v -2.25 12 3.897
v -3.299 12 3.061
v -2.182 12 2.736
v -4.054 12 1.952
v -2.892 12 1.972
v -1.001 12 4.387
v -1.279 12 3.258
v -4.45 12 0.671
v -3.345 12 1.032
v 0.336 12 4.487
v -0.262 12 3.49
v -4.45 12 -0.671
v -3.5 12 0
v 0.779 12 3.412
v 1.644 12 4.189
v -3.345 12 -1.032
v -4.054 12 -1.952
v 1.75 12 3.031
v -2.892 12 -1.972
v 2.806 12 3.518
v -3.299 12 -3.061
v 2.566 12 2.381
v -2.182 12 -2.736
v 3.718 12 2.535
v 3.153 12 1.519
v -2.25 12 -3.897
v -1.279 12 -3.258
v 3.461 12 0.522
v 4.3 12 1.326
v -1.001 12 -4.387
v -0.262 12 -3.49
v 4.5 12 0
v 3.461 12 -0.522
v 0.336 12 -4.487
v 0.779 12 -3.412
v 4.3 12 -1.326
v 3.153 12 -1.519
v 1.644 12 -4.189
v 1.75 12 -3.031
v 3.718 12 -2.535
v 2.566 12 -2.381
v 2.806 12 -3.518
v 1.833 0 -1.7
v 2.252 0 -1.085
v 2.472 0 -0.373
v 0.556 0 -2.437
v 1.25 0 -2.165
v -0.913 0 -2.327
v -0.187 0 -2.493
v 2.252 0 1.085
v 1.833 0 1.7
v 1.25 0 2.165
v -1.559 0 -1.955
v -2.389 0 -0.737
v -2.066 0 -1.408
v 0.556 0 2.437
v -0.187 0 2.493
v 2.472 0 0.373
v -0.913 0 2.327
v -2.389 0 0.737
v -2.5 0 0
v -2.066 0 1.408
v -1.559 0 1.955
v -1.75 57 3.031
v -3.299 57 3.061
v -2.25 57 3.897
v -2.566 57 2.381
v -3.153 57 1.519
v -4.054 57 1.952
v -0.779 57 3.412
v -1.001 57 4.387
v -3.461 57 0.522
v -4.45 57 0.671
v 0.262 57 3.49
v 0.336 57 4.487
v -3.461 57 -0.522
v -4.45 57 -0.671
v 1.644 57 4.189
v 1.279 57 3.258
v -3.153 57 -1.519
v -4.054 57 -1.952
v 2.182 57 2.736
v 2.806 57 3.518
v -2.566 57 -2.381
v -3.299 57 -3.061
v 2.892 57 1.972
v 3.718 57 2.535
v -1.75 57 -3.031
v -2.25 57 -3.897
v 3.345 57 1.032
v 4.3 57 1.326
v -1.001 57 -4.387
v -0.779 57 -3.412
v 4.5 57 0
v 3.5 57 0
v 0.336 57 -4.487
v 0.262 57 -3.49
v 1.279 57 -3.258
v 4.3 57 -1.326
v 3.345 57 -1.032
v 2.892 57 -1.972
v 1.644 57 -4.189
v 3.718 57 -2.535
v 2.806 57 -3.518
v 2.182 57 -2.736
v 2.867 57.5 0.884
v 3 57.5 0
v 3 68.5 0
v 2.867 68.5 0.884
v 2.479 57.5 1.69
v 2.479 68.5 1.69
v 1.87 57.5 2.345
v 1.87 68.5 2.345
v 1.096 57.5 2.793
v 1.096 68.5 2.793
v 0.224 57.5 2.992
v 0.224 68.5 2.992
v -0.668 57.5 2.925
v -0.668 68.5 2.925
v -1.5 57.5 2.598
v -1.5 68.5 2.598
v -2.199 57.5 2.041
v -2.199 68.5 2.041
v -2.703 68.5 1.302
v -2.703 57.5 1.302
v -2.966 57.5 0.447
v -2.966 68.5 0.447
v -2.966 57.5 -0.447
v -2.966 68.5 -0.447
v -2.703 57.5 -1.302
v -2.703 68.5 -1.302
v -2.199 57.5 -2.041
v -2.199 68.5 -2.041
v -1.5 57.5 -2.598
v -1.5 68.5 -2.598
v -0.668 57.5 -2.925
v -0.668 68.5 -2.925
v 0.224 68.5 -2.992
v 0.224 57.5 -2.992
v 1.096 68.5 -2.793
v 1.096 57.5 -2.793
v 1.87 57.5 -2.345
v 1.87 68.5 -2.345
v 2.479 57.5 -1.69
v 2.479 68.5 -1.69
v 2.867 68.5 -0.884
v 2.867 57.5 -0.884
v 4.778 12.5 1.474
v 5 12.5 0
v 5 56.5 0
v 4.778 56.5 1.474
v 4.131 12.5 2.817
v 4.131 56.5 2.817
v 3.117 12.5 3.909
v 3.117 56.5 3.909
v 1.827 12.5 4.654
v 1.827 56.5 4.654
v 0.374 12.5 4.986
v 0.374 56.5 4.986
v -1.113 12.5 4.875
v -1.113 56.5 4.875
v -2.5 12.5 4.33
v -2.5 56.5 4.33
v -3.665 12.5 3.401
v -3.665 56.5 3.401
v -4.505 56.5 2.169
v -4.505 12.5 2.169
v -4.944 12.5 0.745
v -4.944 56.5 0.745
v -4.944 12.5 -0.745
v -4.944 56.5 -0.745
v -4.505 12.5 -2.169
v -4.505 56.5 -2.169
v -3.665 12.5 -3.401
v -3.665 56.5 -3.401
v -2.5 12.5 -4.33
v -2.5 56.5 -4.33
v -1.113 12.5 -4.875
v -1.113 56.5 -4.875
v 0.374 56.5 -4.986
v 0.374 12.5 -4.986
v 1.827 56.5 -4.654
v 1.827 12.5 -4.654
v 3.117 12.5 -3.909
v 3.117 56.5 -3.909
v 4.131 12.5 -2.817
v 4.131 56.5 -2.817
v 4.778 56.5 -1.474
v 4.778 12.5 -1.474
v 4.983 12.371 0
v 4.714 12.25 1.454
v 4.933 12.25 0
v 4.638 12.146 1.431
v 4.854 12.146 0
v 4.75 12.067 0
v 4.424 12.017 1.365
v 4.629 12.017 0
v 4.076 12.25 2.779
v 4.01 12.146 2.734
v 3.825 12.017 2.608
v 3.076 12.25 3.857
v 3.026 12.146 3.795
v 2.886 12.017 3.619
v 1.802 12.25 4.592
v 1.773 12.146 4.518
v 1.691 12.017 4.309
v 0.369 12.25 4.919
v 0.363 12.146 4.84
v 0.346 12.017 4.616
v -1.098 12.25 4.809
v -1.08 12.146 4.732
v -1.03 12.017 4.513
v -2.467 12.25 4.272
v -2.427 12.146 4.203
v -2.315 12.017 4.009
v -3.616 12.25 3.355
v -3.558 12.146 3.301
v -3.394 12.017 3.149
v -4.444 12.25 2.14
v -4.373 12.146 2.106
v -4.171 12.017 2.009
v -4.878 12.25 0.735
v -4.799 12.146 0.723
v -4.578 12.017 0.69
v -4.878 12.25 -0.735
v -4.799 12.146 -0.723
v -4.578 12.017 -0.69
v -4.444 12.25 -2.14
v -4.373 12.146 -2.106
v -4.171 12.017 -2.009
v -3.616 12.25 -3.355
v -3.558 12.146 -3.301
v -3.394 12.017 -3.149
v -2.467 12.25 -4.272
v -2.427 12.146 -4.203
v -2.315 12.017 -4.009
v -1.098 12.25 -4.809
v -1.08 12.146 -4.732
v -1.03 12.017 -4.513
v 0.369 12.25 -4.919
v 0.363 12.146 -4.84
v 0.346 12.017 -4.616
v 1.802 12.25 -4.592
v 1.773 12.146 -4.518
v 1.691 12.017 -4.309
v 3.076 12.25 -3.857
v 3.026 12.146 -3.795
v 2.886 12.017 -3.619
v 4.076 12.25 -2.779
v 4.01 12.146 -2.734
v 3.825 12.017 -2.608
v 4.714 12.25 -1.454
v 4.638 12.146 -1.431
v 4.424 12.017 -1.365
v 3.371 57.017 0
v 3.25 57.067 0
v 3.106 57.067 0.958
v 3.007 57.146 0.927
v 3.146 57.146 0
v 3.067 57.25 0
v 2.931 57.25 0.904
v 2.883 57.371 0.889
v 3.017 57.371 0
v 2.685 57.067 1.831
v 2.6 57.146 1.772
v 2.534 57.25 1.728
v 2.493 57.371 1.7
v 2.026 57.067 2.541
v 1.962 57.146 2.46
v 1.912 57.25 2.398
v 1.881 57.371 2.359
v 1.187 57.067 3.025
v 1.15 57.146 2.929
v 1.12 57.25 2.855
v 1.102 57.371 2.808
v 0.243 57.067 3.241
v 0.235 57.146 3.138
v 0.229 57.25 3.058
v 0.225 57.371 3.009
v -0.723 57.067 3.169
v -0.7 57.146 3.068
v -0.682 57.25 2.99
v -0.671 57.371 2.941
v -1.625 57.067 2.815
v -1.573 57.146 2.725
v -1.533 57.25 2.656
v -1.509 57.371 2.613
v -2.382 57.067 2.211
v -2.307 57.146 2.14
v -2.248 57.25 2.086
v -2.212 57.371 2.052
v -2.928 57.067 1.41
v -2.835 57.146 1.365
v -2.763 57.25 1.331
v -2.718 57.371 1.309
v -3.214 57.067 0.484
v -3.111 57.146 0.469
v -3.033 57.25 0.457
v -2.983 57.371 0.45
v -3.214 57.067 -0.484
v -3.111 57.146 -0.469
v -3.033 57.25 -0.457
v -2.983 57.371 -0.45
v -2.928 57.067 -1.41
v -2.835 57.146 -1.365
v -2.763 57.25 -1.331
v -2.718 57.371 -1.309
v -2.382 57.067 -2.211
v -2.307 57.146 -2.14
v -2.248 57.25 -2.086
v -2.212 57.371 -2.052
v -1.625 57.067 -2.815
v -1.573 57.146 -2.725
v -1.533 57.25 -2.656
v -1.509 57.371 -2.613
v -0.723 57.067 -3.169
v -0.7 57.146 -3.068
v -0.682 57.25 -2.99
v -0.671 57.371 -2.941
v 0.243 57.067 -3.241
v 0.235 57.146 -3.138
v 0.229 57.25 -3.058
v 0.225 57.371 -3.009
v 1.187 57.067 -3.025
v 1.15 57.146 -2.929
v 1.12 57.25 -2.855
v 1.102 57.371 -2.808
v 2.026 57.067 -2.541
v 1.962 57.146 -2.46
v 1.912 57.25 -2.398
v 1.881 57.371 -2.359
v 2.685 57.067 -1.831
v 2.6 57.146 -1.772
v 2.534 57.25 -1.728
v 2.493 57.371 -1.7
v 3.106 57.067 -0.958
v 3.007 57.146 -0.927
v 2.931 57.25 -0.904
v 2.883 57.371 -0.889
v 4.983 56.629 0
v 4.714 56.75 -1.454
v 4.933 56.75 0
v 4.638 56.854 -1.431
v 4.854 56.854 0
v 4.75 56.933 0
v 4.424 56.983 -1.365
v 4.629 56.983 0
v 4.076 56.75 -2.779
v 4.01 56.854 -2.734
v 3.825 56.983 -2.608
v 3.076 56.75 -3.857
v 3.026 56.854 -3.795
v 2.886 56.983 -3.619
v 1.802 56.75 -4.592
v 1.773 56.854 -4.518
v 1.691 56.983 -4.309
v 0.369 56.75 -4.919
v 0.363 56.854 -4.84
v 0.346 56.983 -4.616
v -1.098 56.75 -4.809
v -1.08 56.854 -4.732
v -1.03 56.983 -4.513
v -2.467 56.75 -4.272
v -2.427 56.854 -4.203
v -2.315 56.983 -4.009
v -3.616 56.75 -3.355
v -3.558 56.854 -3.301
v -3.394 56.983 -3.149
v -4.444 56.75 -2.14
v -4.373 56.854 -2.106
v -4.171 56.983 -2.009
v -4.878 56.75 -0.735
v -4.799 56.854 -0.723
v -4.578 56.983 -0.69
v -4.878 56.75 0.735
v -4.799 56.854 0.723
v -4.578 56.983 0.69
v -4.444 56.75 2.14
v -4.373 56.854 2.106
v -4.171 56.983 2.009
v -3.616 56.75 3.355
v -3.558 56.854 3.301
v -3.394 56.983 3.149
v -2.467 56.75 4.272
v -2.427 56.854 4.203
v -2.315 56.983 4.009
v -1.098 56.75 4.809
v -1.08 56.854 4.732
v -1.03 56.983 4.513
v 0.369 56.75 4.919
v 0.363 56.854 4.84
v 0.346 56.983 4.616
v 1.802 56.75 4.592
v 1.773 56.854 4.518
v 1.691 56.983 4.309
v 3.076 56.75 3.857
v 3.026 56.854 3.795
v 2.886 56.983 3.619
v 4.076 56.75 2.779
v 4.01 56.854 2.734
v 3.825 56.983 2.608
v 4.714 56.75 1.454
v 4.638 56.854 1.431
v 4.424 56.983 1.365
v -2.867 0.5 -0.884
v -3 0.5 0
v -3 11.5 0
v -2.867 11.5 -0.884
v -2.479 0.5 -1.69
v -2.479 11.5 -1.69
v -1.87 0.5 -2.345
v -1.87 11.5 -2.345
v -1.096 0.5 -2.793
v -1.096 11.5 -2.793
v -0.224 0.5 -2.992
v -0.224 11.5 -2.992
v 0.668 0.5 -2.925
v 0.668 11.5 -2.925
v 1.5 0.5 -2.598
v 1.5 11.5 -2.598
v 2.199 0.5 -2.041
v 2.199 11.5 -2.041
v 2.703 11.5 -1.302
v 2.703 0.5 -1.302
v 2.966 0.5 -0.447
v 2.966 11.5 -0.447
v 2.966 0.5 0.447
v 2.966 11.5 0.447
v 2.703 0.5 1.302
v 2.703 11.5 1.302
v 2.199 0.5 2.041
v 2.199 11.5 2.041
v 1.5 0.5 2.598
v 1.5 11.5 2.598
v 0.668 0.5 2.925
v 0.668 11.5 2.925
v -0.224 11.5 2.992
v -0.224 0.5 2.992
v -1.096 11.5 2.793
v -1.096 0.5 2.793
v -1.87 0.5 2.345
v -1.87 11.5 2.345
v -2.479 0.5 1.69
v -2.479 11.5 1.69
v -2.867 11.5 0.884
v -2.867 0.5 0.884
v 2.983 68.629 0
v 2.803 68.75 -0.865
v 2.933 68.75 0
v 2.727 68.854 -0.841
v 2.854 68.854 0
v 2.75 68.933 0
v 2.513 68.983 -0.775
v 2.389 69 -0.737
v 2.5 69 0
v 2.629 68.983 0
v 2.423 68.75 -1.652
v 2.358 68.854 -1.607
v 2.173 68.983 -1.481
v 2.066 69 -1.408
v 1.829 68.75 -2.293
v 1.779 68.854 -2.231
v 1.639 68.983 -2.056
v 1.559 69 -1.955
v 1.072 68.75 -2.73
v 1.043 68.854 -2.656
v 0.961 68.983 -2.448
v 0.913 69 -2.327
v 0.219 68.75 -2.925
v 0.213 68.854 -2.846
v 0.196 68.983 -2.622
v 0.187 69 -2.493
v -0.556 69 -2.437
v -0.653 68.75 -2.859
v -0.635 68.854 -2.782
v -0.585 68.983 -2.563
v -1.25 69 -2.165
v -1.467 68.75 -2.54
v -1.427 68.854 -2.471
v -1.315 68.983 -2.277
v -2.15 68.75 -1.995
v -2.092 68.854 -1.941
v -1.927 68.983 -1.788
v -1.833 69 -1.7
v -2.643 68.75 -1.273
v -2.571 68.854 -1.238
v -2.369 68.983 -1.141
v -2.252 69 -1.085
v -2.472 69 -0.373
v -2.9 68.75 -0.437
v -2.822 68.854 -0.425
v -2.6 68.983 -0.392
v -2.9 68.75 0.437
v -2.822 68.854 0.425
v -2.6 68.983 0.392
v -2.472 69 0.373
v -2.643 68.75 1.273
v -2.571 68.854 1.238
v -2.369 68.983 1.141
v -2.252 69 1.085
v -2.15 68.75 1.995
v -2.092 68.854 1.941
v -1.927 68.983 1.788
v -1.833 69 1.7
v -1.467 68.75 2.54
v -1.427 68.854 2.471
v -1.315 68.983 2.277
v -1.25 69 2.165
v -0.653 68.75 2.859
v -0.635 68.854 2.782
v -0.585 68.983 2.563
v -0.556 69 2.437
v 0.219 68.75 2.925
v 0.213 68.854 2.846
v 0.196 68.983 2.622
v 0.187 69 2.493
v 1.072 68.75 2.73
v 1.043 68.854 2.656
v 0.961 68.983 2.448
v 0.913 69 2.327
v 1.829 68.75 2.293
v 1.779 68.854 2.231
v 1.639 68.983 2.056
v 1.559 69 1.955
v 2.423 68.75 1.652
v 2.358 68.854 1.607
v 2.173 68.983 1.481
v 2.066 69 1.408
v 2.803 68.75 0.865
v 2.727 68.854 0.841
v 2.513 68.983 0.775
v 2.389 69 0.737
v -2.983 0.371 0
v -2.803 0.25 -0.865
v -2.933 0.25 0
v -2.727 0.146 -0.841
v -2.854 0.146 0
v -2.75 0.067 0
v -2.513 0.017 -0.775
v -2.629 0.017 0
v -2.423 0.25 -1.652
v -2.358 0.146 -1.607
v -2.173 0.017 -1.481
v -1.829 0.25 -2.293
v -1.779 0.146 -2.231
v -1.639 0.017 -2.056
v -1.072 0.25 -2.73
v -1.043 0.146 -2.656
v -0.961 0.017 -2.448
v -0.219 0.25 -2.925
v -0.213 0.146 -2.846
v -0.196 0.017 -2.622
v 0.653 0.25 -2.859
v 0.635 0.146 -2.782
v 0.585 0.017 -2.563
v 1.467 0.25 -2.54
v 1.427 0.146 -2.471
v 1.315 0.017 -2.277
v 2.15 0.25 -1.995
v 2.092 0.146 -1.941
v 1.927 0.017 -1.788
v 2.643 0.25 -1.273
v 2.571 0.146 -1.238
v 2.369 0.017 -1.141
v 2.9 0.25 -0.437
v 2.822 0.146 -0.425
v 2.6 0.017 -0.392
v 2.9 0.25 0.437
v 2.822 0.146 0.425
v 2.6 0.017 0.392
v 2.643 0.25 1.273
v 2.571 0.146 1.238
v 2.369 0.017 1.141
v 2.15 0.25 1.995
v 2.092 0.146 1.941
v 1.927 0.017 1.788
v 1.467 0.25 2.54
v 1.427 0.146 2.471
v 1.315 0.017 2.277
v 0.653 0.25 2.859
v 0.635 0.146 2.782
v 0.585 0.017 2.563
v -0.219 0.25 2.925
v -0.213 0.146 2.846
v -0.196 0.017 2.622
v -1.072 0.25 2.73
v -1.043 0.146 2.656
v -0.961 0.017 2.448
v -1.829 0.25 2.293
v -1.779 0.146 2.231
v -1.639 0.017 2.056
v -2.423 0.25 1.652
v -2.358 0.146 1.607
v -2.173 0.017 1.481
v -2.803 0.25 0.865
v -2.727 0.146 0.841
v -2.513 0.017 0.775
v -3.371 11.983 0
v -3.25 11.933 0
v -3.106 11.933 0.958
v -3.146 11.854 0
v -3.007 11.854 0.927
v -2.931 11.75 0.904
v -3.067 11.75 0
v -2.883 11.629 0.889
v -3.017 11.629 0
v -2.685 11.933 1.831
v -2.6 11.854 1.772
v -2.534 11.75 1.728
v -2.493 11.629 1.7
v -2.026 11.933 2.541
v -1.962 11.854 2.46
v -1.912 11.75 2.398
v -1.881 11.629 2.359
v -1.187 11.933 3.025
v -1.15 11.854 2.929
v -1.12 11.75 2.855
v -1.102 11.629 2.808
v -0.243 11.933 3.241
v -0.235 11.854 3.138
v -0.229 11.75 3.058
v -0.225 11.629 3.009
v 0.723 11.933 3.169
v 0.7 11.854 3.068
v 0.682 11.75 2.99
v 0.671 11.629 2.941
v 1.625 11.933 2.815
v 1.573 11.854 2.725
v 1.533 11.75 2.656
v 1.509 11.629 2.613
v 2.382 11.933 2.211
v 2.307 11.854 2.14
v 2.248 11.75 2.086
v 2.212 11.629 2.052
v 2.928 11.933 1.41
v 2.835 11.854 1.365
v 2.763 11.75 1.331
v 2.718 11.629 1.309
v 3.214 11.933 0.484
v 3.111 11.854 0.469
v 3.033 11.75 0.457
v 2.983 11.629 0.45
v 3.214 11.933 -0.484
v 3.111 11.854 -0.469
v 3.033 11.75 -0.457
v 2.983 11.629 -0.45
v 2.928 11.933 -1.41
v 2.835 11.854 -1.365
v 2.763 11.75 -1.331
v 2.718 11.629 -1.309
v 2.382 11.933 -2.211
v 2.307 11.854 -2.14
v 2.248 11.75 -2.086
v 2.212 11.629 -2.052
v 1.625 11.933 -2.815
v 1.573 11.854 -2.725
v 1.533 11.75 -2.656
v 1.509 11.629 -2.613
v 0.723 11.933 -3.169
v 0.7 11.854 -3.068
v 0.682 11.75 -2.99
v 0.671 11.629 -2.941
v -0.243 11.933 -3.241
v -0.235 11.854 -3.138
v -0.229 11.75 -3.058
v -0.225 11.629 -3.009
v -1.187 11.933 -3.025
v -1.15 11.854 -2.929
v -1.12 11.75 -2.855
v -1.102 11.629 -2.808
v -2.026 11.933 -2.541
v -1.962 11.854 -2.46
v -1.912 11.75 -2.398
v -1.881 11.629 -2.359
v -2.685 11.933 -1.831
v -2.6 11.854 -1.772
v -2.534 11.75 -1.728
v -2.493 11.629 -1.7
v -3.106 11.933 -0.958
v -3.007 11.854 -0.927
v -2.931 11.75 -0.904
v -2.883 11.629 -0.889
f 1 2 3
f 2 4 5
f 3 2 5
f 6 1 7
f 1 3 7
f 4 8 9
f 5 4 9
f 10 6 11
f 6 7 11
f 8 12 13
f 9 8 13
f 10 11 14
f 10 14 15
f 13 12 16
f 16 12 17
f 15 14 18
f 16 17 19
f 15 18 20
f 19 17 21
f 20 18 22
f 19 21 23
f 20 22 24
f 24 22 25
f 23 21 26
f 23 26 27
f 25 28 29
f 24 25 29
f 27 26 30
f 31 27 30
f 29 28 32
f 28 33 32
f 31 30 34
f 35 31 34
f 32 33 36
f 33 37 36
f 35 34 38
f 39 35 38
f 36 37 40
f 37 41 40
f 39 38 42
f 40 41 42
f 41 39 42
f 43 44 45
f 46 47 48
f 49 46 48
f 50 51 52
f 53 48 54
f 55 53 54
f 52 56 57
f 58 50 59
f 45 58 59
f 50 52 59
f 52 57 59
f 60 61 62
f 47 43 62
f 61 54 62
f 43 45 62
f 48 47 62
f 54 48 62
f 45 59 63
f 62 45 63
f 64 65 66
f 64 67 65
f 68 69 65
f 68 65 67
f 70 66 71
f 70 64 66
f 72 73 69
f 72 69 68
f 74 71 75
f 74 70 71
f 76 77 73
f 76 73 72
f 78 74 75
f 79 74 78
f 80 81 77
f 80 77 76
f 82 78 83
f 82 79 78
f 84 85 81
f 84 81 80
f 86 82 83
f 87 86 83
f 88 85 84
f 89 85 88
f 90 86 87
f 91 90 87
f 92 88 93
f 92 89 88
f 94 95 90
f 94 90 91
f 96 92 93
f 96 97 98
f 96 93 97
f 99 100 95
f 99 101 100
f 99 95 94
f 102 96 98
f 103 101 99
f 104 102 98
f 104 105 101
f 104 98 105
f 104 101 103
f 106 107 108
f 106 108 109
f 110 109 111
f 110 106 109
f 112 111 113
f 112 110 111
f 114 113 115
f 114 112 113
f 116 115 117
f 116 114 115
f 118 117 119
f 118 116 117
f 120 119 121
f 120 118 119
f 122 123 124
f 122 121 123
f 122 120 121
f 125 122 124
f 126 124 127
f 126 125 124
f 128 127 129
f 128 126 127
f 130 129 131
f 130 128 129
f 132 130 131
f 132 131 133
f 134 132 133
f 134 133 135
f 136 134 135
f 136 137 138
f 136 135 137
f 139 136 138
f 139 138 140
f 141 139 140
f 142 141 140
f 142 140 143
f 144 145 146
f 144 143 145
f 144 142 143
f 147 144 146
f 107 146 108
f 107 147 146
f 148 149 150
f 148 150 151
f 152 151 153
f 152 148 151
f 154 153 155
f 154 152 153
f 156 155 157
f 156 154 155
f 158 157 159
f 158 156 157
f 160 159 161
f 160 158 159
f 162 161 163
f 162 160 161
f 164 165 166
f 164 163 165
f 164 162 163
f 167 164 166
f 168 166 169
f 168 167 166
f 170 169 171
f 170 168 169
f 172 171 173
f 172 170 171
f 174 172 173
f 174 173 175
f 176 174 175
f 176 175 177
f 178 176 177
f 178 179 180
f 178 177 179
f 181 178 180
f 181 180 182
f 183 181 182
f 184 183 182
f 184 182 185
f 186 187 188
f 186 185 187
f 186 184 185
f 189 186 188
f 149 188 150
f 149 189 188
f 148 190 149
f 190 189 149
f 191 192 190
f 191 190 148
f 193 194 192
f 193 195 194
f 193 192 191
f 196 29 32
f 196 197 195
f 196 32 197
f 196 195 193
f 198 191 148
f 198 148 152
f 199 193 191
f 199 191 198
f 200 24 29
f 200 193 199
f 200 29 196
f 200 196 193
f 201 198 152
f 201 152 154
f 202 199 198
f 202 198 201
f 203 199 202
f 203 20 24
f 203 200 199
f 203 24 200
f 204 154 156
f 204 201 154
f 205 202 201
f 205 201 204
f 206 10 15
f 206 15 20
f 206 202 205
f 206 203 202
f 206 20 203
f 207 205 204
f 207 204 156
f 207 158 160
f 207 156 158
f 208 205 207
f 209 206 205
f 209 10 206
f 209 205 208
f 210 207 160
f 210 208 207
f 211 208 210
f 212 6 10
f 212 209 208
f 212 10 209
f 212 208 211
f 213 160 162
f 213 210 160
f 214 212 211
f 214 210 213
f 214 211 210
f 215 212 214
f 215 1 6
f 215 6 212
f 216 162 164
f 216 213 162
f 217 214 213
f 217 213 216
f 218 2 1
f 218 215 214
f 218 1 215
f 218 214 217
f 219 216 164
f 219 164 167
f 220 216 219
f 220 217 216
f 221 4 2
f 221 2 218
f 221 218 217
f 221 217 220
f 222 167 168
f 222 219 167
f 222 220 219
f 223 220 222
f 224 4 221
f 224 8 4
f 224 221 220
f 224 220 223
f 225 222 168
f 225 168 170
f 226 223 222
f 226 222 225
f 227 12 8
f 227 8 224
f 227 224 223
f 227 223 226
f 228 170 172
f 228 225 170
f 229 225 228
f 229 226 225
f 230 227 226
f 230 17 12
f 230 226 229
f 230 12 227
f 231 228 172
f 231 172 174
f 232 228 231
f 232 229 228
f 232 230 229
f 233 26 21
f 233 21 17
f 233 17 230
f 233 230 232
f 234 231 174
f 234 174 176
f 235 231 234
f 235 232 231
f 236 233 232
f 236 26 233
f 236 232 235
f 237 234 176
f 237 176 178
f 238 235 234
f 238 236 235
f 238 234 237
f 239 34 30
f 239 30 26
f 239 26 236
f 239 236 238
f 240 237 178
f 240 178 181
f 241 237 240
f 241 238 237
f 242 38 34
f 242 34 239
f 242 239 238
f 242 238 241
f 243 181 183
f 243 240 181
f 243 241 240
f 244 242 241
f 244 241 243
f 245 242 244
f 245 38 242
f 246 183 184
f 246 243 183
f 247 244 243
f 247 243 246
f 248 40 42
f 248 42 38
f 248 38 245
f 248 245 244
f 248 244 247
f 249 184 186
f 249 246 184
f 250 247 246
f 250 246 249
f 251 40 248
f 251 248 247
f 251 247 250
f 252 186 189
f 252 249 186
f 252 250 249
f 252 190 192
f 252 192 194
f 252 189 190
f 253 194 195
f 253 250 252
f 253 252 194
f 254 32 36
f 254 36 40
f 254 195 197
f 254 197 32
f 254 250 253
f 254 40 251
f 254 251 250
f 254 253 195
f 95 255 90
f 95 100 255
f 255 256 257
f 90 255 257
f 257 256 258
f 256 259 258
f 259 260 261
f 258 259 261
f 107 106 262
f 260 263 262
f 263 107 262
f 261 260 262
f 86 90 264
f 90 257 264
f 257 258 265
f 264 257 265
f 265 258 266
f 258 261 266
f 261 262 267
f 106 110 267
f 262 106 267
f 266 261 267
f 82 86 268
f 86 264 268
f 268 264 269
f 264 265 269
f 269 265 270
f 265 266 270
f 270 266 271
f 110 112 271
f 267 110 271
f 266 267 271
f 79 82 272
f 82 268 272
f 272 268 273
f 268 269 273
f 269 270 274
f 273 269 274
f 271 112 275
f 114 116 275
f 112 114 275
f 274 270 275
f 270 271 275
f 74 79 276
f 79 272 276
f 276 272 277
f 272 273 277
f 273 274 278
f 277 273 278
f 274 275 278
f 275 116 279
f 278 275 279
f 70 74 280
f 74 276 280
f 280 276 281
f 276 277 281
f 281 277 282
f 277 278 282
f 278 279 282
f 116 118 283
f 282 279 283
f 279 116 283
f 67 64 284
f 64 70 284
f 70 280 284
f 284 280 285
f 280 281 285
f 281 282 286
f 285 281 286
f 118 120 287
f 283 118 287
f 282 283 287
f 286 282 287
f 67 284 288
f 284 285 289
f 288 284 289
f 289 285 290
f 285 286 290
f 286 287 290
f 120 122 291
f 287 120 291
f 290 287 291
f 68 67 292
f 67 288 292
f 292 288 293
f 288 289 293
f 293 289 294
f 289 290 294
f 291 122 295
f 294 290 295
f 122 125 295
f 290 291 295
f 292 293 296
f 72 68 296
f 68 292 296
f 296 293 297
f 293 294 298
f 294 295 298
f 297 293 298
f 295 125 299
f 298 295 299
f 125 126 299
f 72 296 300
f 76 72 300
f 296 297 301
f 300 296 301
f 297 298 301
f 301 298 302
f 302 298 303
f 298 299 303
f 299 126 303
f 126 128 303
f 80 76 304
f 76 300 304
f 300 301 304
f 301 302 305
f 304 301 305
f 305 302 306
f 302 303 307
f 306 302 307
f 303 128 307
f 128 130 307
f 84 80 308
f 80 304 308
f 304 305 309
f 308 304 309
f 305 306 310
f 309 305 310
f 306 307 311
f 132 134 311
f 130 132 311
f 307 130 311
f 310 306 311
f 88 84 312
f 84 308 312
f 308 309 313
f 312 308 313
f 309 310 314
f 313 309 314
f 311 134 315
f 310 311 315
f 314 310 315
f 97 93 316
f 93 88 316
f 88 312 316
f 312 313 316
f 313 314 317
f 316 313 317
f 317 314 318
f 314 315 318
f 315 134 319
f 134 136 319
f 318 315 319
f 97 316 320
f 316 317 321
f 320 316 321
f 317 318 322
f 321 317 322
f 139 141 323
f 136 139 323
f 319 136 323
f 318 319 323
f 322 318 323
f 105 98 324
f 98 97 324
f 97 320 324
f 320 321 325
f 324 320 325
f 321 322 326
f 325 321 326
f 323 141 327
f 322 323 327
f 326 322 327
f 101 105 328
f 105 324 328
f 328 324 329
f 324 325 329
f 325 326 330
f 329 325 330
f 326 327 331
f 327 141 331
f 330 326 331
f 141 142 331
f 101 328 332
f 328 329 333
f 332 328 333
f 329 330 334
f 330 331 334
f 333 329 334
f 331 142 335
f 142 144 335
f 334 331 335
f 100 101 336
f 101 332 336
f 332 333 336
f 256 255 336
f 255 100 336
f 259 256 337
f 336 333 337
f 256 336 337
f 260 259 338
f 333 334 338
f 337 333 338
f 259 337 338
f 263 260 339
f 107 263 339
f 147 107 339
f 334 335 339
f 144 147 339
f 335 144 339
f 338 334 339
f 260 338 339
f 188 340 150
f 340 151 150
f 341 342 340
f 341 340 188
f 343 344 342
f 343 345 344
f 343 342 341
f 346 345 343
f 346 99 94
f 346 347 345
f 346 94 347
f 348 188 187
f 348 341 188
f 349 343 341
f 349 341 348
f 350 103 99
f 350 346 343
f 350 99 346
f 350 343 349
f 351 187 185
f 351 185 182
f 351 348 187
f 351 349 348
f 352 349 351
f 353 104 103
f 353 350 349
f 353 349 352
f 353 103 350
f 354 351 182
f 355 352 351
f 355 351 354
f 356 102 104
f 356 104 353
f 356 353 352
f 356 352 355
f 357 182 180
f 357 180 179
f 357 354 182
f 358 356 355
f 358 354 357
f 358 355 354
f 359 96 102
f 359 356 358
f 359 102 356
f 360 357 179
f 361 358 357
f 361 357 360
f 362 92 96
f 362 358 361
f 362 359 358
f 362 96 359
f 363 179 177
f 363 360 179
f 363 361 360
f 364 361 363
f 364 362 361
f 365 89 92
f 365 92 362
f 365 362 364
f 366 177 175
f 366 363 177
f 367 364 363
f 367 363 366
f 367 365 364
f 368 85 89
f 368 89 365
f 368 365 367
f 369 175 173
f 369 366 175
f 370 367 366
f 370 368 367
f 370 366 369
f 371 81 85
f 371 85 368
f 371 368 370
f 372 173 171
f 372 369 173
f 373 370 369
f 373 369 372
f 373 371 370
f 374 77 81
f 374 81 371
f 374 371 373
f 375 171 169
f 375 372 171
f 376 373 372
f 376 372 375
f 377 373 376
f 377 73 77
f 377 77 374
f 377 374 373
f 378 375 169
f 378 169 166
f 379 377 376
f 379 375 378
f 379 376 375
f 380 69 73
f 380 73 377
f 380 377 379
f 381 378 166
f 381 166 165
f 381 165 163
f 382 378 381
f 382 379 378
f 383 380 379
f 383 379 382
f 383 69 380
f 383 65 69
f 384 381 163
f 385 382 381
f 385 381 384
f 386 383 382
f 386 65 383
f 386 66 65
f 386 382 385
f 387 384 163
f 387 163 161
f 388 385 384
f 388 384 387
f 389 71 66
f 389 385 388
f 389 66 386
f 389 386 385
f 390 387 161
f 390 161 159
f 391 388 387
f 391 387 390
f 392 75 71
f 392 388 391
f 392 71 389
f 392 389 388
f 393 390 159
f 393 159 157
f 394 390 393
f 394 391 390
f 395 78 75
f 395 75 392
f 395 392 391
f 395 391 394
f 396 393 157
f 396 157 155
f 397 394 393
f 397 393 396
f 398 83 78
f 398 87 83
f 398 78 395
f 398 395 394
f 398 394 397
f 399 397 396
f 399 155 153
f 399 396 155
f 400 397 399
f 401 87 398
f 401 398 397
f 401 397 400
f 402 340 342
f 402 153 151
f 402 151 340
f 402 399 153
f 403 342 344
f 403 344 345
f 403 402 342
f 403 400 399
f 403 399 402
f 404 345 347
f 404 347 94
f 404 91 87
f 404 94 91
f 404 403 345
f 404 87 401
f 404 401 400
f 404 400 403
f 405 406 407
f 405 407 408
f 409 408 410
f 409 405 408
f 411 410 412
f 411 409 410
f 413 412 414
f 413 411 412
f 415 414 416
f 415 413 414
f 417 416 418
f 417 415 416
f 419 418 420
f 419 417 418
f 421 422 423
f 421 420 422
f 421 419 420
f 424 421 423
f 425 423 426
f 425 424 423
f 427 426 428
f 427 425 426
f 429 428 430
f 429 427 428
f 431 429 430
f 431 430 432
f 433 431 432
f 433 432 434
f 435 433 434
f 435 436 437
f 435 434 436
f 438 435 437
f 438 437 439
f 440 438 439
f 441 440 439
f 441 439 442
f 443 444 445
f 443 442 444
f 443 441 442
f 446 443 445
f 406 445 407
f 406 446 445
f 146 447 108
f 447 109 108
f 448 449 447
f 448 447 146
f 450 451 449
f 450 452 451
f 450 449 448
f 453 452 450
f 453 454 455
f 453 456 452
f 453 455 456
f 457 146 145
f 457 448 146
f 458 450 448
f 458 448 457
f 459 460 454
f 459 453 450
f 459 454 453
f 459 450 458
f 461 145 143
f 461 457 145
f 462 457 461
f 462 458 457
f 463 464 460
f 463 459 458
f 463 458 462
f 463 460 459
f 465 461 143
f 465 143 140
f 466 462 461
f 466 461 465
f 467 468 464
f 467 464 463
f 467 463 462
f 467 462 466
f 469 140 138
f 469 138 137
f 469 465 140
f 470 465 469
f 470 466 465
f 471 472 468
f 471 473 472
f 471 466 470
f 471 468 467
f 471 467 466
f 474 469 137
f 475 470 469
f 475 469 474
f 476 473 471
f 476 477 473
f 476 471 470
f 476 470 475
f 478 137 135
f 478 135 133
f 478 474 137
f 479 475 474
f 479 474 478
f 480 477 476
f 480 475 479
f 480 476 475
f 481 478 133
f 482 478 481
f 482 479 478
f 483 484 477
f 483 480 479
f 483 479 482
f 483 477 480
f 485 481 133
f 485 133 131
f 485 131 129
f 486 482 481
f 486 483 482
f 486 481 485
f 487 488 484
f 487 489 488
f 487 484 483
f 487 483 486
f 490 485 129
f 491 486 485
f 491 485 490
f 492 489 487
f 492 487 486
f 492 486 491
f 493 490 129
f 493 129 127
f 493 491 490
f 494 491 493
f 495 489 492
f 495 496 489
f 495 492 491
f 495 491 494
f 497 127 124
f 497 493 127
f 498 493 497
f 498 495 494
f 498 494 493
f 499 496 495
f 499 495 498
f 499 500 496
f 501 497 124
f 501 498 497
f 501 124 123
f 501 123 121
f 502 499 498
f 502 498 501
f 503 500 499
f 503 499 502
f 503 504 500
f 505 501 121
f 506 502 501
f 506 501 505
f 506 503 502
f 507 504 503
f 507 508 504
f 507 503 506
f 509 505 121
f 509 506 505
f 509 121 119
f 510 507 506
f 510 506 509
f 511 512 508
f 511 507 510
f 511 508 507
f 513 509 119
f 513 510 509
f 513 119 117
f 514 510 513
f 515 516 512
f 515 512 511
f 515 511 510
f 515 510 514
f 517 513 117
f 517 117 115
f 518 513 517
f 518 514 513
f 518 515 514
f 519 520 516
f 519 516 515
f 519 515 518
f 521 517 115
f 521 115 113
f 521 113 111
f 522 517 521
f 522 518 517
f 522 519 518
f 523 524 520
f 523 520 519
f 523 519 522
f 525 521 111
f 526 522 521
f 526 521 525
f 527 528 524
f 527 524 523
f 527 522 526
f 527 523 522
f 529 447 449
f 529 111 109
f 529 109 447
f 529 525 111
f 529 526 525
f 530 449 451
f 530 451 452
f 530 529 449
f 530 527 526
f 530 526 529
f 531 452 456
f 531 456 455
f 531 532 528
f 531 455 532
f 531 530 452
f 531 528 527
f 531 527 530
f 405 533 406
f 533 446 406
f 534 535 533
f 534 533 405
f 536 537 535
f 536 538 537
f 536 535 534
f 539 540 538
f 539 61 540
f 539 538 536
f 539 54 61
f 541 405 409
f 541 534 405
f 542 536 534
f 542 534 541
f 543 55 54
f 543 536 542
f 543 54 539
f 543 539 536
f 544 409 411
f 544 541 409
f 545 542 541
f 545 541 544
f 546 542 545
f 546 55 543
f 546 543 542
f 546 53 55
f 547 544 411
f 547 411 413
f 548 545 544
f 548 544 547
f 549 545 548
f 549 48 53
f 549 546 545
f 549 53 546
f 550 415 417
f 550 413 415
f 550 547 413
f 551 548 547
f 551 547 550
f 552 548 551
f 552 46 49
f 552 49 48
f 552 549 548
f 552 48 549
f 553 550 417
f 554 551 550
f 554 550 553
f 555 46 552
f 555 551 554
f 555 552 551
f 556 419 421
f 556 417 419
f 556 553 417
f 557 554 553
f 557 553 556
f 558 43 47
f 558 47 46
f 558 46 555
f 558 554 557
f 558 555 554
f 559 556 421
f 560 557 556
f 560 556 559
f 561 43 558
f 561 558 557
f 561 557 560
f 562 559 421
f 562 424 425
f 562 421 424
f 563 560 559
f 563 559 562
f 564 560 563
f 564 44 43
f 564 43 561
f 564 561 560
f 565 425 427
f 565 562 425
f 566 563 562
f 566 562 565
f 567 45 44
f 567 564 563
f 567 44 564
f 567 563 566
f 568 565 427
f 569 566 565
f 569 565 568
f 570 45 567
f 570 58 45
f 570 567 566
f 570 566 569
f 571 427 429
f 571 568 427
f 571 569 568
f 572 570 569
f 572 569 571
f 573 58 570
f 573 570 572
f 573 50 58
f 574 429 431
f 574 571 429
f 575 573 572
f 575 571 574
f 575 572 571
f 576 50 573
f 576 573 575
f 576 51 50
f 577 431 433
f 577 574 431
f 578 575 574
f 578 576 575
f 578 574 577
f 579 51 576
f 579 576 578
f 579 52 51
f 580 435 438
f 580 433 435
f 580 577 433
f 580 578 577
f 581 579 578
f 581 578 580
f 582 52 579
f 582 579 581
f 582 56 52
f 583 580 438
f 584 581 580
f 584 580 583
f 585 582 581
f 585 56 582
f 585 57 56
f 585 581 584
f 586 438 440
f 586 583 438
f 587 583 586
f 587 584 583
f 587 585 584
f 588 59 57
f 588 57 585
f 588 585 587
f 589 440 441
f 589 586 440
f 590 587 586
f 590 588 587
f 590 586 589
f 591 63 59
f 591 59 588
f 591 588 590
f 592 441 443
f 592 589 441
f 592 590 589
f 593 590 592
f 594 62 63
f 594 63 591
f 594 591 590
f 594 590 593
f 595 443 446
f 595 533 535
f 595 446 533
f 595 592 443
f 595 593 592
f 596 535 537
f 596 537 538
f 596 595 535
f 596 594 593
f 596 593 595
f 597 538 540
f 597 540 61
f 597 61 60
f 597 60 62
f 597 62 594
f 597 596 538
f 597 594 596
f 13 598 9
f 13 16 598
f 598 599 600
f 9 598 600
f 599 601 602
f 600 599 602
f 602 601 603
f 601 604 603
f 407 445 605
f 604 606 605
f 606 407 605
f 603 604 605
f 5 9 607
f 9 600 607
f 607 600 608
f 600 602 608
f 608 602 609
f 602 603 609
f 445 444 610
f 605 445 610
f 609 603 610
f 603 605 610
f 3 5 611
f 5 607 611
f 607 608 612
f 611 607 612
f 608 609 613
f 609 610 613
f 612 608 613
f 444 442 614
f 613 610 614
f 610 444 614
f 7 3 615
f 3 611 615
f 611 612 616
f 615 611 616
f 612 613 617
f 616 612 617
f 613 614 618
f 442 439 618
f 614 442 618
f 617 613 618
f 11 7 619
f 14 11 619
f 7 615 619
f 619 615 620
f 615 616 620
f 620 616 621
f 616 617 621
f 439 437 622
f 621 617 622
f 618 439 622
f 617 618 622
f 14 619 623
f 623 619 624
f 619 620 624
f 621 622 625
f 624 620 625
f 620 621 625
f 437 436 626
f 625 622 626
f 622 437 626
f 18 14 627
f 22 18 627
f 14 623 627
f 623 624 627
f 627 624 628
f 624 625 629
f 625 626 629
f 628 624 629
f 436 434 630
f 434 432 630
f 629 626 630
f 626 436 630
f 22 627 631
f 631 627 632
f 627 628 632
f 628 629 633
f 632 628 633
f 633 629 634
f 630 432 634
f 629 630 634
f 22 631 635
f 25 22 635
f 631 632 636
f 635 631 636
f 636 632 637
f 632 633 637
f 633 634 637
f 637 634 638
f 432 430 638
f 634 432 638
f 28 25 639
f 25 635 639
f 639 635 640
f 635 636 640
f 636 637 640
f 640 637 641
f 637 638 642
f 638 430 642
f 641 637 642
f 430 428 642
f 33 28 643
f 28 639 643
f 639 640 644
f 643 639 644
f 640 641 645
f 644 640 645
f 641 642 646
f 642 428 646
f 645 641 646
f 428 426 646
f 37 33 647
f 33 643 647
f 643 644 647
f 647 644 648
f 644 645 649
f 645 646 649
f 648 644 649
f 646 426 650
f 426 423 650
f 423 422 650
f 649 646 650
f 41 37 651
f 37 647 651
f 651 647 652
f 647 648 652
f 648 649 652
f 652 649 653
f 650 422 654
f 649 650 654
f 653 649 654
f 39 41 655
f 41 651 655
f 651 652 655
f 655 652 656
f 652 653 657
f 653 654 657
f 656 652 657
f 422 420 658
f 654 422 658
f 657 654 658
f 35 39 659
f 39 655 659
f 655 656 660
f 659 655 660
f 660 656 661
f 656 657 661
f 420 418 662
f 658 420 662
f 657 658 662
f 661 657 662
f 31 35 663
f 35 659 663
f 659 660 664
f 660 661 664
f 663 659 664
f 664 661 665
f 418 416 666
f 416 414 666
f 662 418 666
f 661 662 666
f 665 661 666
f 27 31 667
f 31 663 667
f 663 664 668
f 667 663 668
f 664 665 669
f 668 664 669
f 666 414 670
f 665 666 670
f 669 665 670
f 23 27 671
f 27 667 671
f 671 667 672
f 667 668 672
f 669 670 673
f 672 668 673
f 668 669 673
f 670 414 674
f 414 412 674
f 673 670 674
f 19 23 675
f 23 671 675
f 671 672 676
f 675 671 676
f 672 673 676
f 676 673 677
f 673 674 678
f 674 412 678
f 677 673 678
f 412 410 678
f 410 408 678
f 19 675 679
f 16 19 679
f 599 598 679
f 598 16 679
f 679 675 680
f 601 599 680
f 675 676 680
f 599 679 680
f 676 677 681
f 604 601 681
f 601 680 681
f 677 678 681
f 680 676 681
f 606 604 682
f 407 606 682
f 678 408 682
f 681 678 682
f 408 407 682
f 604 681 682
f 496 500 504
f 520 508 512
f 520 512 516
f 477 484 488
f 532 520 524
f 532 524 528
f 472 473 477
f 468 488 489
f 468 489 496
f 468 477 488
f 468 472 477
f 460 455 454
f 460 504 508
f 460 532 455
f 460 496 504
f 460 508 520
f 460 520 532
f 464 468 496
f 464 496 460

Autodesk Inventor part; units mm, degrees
ref_plane "YZ Plane" through (0, 0, 0) normal (1, 0, 0) x (0, 1, 0)
ref_plane "XZ Plane" through (0, 0, 0) normal (0, 1, 0) x (-1, 0, 0)
ref_plane "XY Plane" through (0, 0, 0) normal (0, 0, 1) x (1, 0, 0)
sketch "Sketch1" plane through (0, 0, 0) normal (0, 1, 0) x (-1, 0, 0)
  circle A0 centre (0, 0) radius 3
  dimension "d0" = 6
extrude "Extrusion1" add sketch "Sketch1" along normal blind 12
sketch "Sketch2" plane through (0, 12, 0) normal (0, 1, 0) x (1, 0, 0)
  circle A0 centre (0, 0) radius 5
  dimension "d3" = 10
extrude "Extrusion2" add sketch "Sketch2" along normal blind 45
sketch "Sketch3" plane through (0, 57, 0) normal (0, 1, 0) x (1, 0, 0)
  circle A0 centre (0, 0) radius 3
  dimension "d6" = 6
extrude "Extrusion3" add sketch "Sketch3" along normal blind 12
fillet "Fillet1" radius 0.5 6 edges at (-3, 69, 0) (-3, 57, 0) (-5, 57, 0) (-5, 12, 0) (3, 12, 0) (3, 0, 0)
thread "Thread1" size "M6x1" class "6g" standard "ISO Metric profile" full length
properties part number "Z-Abstandhalter"
